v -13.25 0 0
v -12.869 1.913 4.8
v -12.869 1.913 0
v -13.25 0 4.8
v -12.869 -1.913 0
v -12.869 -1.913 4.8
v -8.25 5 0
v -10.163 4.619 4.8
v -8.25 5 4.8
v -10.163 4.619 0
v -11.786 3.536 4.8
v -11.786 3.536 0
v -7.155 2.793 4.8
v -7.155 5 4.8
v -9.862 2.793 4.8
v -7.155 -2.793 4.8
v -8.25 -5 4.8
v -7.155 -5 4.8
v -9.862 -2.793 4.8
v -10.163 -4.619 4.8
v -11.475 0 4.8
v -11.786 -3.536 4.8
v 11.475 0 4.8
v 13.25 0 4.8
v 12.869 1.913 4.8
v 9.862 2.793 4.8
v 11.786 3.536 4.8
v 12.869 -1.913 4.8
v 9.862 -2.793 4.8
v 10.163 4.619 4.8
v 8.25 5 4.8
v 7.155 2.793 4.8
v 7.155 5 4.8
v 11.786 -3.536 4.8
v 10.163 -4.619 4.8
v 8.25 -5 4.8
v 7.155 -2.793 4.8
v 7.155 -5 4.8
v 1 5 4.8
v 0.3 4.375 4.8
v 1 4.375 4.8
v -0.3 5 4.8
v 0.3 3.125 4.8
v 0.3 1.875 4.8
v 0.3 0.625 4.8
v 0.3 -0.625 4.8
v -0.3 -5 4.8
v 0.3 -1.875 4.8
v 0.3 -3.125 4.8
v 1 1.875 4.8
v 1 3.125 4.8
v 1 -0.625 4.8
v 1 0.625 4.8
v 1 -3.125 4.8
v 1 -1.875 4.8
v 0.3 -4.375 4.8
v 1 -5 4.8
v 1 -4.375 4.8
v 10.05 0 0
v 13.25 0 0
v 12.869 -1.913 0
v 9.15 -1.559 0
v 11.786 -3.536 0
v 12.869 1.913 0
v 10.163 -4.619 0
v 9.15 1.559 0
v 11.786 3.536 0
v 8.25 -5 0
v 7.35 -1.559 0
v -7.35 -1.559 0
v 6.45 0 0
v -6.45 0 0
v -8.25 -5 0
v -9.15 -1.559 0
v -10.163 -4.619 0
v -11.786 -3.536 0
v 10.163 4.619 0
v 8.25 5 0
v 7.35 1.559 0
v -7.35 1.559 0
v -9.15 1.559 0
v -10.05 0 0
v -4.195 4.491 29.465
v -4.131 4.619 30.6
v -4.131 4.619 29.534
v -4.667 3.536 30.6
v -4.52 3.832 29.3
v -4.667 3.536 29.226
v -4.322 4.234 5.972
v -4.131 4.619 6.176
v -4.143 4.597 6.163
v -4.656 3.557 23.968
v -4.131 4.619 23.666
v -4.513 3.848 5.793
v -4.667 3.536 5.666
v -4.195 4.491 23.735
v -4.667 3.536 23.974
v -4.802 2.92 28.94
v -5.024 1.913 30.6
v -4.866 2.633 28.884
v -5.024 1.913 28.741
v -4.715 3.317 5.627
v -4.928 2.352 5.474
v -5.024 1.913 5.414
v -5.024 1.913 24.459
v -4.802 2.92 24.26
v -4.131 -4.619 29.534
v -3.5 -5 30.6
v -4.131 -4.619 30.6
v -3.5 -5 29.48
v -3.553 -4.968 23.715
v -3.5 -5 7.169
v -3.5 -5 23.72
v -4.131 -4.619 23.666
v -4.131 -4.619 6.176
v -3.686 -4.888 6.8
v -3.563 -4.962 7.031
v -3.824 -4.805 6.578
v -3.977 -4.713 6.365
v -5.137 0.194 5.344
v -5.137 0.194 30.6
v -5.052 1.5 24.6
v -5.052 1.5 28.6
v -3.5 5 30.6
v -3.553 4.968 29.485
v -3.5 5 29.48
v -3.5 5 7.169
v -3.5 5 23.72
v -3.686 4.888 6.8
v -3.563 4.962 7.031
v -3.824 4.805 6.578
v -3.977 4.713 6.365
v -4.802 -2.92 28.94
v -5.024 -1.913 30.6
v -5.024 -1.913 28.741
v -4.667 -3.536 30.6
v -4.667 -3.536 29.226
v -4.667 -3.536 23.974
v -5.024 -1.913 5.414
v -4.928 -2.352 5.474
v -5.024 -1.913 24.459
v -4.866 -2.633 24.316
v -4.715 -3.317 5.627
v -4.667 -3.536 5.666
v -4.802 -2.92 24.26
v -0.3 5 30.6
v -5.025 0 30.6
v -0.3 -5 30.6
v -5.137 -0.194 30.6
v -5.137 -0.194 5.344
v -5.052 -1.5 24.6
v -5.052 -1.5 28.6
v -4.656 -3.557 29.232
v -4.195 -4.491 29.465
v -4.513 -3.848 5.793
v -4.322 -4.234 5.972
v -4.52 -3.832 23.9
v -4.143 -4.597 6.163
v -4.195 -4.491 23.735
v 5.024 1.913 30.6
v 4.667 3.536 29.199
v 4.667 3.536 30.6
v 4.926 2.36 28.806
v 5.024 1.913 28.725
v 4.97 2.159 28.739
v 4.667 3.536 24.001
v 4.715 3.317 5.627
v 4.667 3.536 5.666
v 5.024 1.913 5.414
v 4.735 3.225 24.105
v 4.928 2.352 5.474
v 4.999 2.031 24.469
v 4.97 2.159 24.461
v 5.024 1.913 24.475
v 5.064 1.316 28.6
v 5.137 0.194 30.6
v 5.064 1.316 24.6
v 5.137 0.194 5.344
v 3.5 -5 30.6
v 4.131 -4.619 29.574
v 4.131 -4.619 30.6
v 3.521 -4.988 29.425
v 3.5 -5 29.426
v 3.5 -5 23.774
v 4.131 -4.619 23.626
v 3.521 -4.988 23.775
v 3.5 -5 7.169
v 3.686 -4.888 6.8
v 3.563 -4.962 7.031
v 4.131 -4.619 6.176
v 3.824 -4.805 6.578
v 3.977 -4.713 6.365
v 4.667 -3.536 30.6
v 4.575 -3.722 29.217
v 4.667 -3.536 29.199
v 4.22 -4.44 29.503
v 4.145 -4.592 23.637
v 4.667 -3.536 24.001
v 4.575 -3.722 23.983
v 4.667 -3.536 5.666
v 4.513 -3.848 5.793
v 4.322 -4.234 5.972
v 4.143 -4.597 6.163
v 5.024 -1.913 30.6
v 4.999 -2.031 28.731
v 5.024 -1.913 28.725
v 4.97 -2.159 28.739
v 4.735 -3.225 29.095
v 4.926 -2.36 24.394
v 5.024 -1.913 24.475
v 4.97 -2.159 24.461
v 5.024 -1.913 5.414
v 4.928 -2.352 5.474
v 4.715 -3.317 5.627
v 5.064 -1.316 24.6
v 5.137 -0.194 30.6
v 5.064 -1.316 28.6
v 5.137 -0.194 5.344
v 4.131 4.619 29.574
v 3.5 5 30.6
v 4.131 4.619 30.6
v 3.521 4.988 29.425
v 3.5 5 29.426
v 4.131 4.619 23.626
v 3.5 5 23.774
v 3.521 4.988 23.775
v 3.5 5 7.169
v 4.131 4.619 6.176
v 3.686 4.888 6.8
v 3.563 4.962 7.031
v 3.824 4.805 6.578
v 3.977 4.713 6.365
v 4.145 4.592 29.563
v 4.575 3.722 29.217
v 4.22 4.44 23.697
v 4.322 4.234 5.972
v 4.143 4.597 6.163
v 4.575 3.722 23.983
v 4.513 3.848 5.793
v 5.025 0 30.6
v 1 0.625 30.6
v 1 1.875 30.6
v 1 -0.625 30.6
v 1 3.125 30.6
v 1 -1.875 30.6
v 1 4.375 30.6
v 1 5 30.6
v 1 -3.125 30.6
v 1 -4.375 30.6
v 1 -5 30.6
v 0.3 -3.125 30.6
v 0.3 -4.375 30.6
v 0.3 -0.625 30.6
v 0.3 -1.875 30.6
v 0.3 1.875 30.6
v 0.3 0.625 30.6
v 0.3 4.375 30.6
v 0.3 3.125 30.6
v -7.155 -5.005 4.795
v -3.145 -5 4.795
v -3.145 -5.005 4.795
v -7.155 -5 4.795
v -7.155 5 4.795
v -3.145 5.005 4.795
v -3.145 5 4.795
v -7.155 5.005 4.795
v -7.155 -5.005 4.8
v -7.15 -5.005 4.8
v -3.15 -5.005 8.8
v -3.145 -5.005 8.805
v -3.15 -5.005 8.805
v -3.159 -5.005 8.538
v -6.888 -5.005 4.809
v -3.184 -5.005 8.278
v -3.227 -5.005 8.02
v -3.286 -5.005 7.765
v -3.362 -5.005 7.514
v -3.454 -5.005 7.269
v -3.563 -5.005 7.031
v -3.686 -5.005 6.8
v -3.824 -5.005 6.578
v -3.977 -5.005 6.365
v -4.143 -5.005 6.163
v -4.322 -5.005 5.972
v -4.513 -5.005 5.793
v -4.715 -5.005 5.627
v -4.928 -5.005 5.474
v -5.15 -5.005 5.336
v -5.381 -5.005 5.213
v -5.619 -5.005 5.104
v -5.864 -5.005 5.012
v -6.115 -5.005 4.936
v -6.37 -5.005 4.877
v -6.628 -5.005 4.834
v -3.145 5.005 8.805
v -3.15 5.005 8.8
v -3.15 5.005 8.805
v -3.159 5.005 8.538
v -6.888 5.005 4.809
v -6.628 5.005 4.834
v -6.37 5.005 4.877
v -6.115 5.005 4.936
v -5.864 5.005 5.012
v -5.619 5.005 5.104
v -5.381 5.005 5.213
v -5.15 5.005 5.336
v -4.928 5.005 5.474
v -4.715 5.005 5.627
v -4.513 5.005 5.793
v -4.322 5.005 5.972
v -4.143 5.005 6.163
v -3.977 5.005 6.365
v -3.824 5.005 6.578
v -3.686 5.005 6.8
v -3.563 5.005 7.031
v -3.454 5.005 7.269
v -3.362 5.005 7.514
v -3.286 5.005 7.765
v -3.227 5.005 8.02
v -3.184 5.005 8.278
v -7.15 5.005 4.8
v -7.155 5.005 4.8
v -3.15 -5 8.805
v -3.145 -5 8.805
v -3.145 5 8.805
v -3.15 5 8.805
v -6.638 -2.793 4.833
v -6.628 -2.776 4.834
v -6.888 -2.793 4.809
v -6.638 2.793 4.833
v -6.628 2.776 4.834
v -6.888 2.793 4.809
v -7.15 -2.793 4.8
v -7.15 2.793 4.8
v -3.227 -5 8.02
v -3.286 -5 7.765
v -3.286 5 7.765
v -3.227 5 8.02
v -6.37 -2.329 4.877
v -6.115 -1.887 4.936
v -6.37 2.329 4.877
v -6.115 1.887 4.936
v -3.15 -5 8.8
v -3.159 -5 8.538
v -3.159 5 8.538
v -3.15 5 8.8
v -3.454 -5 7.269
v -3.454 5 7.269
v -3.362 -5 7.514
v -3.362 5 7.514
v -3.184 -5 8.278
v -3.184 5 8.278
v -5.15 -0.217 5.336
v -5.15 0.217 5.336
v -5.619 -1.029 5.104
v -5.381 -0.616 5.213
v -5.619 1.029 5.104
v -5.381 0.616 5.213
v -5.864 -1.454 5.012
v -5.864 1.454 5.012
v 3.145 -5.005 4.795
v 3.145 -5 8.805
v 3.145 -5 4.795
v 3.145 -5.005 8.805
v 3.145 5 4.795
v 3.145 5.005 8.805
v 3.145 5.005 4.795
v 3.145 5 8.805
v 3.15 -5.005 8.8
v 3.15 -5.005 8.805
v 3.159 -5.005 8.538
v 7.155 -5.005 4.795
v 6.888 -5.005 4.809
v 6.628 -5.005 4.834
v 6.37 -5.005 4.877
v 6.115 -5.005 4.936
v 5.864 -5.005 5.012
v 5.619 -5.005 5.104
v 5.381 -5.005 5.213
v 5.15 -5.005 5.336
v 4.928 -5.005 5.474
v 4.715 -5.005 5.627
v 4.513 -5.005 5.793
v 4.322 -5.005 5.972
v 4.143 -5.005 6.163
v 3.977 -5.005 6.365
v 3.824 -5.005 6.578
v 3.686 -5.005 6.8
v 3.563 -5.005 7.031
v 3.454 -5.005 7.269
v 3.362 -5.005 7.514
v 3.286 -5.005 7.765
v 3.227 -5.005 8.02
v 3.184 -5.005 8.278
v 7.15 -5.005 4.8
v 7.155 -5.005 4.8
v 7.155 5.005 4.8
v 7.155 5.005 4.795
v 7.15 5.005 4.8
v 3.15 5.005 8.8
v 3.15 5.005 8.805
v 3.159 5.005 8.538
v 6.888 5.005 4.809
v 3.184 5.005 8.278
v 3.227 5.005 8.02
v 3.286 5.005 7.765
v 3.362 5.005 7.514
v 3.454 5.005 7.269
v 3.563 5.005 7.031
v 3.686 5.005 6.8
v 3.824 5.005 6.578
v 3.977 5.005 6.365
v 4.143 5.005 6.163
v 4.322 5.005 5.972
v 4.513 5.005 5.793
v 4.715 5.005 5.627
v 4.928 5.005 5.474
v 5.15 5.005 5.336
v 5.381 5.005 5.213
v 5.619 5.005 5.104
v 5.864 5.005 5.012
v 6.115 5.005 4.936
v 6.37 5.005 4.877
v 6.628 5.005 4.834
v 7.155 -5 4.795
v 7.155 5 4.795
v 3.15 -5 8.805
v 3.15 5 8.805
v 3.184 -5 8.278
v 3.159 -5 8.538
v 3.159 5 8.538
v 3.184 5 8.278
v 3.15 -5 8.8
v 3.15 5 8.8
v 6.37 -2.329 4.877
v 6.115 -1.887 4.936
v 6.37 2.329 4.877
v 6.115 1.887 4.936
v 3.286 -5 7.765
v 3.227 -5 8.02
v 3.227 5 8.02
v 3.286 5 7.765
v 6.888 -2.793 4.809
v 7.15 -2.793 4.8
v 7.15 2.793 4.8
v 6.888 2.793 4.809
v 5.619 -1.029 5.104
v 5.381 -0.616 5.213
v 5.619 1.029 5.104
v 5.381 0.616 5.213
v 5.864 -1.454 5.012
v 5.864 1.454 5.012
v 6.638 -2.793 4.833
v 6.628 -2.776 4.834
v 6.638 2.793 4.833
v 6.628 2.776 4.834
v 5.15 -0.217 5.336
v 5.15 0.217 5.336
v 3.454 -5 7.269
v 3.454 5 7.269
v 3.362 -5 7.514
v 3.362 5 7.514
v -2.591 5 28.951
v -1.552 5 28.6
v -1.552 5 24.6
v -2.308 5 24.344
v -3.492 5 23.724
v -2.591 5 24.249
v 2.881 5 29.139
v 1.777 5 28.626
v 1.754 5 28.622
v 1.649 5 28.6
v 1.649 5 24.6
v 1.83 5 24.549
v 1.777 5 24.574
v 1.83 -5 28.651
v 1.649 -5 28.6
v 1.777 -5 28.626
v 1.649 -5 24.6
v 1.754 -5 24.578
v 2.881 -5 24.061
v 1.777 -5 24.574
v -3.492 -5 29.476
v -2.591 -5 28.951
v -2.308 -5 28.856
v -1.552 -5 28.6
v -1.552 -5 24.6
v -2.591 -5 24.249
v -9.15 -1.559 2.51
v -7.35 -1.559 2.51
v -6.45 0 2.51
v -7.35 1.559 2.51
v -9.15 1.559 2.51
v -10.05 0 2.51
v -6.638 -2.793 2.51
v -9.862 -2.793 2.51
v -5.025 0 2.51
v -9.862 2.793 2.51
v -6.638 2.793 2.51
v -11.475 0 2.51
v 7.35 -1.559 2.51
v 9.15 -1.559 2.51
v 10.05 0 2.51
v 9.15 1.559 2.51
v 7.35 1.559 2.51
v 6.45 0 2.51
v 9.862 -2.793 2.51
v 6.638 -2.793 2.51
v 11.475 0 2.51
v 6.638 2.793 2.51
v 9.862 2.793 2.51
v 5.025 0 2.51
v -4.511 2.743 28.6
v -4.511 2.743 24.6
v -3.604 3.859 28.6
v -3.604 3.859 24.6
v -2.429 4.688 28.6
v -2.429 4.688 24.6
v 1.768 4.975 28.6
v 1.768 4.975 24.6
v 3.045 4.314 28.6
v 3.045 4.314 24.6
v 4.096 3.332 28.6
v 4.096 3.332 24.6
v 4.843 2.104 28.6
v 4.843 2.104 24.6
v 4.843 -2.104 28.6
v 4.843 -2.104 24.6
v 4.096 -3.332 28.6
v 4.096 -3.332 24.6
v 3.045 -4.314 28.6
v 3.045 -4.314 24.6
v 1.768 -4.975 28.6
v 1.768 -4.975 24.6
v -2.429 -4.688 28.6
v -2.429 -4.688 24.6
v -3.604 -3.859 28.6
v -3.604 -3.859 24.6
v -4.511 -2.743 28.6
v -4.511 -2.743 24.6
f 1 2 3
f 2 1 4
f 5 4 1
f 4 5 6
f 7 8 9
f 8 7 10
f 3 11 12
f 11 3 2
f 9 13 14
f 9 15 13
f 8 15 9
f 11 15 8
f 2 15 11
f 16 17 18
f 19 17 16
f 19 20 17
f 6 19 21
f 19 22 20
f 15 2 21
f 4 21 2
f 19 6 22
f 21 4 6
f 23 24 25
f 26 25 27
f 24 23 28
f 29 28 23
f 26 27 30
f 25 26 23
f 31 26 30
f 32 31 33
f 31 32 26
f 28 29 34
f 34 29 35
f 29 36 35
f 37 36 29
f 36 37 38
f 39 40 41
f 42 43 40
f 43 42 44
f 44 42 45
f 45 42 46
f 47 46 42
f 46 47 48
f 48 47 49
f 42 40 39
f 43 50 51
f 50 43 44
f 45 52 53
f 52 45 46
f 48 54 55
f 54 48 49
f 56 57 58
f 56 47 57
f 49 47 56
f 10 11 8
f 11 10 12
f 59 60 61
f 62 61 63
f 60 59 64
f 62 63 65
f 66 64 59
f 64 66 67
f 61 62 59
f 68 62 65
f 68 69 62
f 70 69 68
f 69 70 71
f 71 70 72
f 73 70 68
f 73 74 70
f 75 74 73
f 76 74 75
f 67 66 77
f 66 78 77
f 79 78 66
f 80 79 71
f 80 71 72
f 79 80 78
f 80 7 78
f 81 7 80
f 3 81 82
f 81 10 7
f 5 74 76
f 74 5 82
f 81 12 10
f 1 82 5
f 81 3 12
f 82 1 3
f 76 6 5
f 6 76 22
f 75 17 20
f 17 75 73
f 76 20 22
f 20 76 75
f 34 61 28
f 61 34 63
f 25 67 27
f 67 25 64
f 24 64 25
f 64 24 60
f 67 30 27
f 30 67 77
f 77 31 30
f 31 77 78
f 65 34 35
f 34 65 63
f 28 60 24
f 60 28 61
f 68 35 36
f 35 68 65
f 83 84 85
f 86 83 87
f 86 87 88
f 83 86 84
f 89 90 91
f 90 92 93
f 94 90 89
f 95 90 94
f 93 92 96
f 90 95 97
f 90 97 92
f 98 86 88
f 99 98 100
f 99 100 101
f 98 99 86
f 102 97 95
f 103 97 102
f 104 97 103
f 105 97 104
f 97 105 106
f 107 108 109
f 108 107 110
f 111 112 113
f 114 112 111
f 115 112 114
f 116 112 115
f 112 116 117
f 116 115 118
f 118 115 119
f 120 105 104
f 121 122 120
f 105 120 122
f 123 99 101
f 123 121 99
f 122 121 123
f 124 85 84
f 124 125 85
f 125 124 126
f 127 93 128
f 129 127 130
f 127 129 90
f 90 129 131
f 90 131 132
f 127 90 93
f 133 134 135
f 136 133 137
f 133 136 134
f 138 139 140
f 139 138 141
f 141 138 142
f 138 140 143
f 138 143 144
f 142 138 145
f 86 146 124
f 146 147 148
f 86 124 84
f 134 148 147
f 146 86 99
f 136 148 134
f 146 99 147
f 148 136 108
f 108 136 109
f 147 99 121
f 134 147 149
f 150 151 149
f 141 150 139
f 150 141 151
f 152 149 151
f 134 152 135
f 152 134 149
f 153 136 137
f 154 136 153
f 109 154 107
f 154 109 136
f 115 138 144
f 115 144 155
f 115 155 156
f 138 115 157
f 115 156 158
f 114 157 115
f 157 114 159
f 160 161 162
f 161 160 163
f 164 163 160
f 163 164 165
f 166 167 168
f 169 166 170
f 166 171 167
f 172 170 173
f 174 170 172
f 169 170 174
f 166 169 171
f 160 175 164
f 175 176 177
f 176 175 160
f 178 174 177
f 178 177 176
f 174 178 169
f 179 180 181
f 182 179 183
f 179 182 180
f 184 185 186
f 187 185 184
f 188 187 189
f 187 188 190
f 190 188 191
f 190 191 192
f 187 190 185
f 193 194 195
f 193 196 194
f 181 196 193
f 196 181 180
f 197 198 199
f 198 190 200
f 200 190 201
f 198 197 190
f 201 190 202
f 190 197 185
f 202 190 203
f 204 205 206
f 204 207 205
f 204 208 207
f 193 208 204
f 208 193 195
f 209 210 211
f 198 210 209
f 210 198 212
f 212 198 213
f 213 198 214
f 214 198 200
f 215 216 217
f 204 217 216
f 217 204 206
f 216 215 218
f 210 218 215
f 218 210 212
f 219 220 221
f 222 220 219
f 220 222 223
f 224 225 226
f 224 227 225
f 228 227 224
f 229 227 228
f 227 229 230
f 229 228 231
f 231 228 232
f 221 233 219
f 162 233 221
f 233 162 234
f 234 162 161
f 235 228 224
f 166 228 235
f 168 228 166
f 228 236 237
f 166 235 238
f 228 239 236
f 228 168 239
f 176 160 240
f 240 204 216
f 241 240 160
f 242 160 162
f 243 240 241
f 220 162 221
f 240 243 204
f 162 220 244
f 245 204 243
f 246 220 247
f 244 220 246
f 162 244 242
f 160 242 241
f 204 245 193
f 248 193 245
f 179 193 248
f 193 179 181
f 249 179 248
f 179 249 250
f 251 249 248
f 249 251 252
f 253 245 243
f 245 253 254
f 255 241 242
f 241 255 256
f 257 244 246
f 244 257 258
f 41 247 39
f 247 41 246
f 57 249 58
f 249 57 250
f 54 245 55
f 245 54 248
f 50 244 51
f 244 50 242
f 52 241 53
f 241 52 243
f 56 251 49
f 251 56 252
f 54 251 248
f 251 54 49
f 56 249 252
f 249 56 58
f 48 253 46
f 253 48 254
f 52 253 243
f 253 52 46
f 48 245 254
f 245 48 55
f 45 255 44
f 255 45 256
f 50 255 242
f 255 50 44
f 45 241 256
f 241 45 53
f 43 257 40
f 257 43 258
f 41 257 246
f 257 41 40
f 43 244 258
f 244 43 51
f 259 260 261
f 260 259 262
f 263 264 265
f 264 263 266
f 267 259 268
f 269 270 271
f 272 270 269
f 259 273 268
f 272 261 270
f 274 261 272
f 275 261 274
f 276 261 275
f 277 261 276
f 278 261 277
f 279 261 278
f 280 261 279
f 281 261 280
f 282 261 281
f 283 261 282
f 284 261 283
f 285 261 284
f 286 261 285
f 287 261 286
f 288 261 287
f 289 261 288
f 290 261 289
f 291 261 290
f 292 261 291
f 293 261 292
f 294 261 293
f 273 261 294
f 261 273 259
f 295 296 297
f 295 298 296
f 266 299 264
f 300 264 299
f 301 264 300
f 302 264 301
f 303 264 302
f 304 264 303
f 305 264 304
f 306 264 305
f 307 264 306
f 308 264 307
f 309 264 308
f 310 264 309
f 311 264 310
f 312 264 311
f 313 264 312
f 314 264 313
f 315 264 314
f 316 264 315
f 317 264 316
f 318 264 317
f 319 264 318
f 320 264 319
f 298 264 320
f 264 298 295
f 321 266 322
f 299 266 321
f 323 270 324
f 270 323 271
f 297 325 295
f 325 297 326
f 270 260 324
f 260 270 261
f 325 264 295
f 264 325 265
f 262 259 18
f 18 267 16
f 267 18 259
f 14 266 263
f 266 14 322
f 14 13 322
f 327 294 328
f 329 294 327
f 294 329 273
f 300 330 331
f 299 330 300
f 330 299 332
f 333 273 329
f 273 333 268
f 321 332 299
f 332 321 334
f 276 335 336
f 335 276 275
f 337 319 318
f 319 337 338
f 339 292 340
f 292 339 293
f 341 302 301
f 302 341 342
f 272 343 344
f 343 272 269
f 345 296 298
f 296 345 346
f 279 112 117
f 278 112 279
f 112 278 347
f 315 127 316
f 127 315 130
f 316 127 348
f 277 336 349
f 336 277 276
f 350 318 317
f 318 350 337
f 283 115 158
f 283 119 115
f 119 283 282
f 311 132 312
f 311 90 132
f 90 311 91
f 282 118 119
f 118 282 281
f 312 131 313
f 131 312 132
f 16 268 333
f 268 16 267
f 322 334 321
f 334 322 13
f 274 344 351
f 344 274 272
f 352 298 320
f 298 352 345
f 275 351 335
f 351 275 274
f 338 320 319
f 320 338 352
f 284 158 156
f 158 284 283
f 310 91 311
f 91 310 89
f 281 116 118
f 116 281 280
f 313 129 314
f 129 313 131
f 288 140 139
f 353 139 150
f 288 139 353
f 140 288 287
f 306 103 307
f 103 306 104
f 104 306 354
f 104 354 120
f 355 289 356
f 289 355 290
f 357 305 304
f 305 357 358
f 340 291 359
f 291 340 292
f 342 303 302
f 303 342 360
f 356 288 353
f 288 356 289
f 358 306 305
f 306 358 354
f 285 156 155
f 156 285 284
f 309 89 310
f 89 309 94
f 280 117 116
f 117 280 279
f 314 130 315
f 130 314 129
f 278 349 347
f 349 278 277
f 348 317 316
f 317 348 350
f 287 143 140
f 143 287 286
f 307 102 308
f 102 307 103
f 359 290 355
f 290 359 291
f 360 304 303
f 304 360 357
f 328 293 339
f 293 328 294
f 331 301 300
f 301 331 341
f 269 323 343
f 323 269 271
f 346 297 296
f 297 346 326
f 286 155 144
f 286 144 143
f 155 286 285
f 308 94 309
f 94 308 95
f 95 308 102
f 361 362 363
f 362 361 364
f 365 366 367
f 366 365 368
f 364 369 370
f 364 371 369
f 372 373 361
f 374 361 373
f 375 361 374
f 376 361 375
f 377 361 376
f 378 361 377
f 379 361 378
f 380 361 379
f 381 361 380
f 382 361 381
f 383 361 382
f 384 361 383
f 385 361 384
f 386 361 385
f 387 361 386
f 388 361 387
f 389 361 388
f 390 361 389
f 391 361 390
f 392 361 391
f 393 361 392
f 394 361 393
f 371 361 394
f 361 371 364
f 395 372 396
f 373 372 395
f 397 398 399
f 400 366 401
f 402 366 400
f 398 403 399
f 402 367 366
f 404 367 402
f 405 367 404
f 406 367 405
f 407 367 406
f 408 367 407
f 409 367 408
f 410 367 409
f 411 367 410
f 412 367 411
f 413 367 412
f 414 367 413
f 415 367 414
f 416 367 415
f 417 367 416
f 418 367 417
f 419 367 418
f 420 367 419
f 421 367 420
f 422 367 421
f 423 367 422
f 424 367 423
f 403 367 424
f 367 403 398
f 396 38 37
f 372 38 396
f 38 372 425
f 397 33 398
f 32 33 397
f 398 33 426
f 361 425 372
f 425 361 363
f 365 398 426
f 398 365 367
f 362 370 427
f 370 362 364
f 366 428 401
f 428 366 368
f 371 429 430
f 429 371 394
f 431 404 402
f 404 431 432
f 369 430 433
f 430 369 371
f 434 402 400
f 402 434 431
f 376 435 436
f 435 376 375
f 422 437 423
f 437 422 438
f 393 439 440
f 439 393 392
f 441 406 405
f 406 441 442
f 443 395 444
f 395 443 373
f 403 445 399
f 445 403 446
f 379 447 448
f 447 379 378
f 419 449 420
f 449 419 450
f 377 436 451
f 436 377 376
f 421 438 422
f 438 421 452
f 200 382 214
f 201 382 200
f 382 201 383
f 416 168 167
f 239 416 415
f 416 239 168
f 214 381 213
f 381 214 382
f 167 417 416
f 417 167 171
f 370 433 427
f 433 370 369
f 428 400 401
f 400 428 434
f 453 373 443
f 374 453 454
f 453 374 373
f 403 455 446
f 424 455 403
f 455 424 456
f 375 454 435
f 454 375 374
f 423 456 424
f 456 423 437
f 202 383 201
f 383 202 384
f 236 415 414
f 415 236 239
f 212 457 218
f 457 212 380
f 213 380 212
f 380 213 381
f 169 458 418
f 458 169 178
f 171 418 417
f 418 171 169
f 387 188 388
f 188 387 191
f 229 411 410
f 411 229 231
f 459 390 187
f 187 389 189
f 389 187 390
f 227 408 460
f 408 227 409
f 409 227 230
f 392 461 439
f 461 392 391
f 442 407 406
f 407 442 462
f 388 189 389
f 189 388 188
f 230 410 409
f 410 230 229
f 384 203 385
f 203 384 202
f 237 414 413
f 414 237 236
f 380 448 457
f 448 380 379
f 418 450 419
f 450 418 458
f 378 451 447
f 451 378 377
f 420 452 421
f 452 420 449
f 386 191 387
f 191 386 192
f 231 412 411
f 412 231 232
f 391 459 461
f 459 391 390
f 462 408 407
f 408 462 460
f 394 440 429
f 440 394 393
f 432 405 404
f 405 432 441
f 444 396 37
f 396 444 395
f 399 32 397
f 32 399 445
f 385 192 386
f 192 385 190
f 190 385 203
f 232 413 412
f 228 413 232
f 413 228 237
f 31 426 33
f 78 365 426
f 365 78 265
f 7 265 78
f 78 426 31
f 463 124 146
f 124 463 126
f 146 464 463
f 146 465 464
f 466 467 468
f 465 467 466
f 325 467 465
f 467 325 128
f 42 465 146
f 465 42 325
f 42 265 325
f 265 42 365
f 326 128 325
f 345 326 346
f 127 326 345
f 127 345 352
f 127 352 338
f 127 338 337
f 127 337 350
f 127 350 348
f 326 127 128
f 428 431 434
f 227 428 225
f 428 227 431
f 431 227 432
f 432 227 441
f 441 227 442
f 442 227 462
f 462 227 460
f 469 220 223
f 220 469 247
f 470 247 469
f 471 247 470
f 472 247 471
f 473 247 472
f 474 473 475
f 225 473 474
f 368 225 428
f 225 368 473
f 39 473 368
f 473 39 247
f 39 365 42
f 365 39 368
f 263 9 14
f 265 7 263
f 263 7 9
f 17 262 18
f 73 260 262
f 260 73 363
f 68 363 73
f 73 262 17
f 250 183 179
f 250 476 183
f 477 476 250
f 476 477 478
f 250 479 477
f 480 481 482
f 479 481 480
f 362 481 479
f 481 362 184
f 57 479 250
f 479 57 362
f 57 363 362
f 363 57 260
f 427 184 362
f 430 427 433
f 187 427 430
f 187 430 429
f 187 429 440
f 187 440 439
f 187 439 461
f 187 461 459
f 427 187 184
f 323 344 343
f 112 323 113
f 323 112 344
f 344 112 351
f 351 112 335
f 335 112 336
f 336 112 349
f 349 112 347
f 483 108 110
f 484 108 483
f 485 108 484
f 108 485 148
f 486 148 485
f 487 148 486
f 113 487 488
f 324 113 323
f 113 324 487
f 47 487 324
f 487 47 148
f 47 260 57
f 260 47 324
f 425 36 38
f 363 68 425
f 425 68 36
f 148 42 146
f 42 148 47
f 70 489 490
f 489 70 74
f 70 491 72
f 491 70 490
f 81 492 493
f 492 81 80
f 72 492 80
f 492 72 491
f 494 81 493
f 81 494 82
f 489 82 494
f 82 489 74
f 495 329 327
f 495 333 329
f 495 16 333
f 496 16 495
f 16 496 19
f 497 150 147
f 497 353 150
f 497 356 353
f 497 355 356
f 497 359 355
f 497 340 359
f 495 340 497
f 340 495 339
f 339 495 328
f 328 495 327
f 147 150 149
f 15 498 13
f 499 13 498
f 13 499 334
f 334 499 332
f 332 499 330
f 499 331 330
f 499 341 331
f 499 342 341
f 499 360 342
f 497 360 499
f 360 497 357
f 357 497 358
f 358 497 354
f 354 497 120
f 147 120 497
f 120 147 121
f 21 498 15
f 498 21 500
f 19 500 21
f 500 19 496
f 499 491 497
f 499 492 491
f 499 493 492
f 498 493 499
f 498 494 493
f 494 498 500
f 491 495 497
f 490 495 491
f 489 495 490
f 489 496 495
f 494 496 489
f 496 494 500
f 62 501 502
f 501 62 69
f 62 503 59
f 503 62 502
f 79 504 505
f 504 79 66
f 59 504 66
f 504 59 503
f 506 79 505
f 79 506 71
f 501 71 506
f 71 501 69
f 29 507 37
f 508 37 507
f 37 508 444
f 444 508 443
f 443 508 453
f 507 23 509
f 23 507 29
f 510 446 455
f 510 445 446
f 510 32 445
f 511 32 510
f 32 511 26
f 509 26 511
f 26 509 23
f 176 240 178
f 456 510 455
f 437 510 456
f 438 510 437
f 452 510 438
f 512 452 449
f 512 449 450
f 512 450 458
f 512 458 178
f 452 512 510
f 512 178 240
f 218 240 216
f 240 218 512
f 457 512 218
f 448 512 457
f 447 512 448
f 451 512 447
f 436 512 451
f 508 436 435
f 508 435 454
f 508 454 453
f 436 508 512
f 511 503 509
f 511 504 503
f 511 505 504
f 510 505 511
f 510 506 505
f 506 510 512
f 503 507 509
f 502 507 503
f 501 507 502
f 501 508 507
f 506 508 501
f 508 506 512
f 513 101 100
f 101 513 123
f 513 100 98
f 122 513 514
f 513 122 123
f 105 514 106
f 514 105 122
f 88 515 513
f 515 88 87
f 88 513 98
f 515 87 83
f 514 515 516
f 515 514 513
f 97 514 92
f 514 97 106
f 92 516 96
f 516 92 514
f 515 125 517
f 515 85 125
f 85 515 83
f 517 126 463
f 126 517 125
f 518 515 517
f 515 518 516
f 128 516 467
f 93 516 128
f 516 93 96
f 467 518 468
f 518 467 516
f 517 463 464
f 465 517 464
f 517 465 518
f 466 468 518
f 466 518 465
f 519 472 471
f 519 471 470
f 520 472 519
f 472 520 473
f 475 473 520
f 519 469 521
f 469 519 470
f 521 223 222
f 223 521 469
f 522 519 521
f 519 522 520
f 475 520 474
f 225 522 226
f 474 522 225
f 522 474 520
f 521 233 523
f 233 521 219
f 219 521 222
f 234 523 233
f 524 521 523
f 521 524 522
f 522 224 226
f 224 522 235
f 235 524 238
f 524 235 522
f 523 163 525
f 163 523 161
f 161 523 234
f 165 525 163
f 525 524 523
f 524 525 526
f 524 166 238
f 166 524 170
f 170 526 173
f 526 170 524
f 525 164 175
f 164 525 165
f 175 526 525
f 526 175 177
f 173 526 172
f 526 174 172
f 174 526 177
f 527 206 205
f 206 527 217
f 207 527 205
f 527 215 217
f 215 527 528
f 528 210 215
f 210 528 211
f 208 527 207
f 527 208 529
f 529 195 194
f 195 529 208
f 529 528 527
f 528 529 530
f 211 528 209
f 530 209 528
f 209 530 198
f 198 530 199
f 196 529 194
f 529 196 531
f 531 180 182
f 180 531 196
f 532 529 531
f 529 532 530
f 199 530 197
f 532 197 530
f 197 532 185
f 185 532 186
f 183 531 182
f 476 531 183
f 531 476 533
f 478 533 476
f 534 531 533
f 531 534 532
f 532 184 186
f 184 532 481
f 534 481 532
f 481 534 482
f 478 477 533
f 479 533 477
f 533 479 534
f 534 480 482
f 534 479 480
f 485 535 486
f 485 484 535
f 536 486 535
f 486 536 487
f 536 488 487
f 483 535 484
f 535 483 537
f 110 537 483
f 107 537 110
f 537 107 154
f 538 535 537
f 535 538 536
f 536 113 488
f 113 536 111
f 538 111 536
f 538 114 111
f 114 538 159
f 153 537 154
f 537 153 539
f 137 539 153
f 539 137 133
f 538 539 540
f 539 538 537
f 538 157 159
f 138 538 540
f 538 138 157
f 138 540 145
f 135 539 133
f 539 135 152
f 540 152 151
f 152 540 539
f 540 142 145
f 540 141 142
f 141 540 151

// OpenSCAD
// file: roundEdges.scad
/* roundEdges
 * Copyright (c) 2012 by Krallinger Sebastian [s.krallinger+cc@gmail.com]
 * Dual-licensed under 
 * Creative Commons Attribution-ShareAlike 3.0 (CC BY-SA) [http://creativecommons.org/licenses/by-sa/3.0/]
 * and
 * LGPL v2 or later [http://www.gnu.org/licenses/].
 */


//Rounded Edges
module roundEdge(_a=0,_r=1,_l=1,_fn=100){
	rotate (a=[0,0,_a]){
		translate(v=[_r,_r,0]){
			rotate (a=[0,0,0]) rotate (a=[0,0,180]){
				difference() {
					translate (v=[-OS/2,-OS/2,-OS/2])
						cube (size = [_r+OS,_r+OS,_l+OS],center=false );
					translate (v=[0,0,-OS*2/2])
						cylinder (h = _l+OS*2, r=_r, center = false, $fn=_fn);
				}
			}
		}
	}
}
//roundEdge(_a=0,_l=10);
// file: utilities.scad
/*
 * Utility functions.
 *
 * Originally by Hans Häggström, 2010.
 * Dual licenced under Creative Commons Attribution-Share Alike 3.0 and LGPL2 or later
 */

//include <units.scad>


/******************** Disance Poins ******************************/
function distance3D(a,b) =sqrt( (a[0] - b[0])*(a[0] - b[0]) +
                                (a[1] - b[1])*(a[1] - b[1]) +
                                (a[2] - b[2])*(a[2] - b[2]) );
//Obsolet
function distance(a, b) = distance3D(a,b);

function distance2D(a,b) = sqrt( (a[0] - b[0])*(a[0] - b[0]) +
                                (a[1] - b[1])*(a[1] - b[1]));
								
function distance1D(a,b) = sqrt(a*a+b*b);
//Obsolet
function length2(a) = distance1D(a[0],a[1]);


/************************ vector *************************/
function normalized(a) = a / (max(distance3D([0,0,0], a), 0.00001));

function normalized_axis(a) = a == "x" ? [1, 0, 0]:
                   a == "y" ? [0, 1, 0]:
                   a == "z" ? [0, 0, 1]: normalized(a);

function angleOfNormalizedVector(n) = [0, -atan2(n[2], distance1D([n[0], n[1]])), atan2(n[1], n[0]) ];

function angle(v) = angleOfNormalizedVector(normalized(v));

function angleBetweenTwoPoints(a, b) = angle(normalized(b-a));

function _angleVectore2D(a) = atan2(a[0],a[1]);
function angle_betweentTwoPoints2D (a,b) = _angleVectore2D(b-a);


/********************** Circel ***************************/

function circel_area(r) = PI * r * r;

function circel_radius3Points(a,b,c) = (distance2D(a,b) * distance2D(b,c) * distance2D(c,a)) / (4 * triangle_area3Points(a,b,c));

function circel_radius3lengths(a,b,c) = (a*b*c) / (4 * triangle_area3lengths(a,b,c));


/********************** triangle **************************/
//Satz des Heron
function triangle_area3lengths(a,b,c) = sqrt((a+b+c)*(a+b-c)*(b+c-a)*(c+a-b))/4;

function triangle_area3Points(a,b,c) = triangle_area3lengths(distance2D(a,b),distance2D(b,c),distance2D(c,a));



/************************** coordinate systems translation ****/
//[radius,phi] <=> [x,y]
function conv2D_cartesian2polar(x) = [ distance1D(x[0],x[1]) , atan2(x[1],x[0]) ];
function conv2D_polar2cartesian(x) = [ x[0]*cos(x[1]) , x[0]*sin(x[1]) ];


CENTER = 0;
LEFT = -0.5;
RIGHT = 0.5;
TOP = 0.5;
BOTTOM = -0.5;

FlatCap =0;
ExtendedCap =0.5;
CutCap =-0.5;


module fromTo(from=[0,0,0], to=[1,0,0], size=[1, 1], align=[CENTER, CENTER], material=[0.5, 0.5, 0.5], name="", endExtras=[0,0], endCaps=[FlatCap, FlatCap], rotation=[0,0,0], printString=true) {

  angle = angleBetweenTwoPoints(from, to);
  length = distance(from, to) + endCaps[0]*size[0] + endCaps[1]*size[0] + endExtras[0] + endExtras[1];

  if (length > 0) {
    if (printString) echo(str( "  " ,name, " ", size[0], "mm x ", size[1], "mm, length ", length, "mm"));

    color(material)
      translate(from)
        rotate(angle)
          translate( [ -endCaps[0]*size[0] - endExtras[0], size[0]*(-0.5-align[0]), size[1]*(-0.5+align[1]) ] )
            rotate(rotation)
              scale([length, size[0], size[1]]) child();
  }
}

module part(name) {
  echo("");
  echo(str(name, ":"));
}
// file: config.scad
/* config [c]
 * Copyright (c) 2012 by Krallinger Sebastian [s.krallinger+cc@gmail.com]
 * Dual-licensed under 
 * Creative Commons Attribution-ShareAlike 3.0 (CC BY-SA) [http://creativecommons.org/licenses/by-sa/3.0/]
 * and
 * LGPL v2 or later [http://www.gnu.org/licenses/].
 */

/******************************************************************************/ 
/*                              Main configuration                            */
/******************************************************************************/

/*-----------------------------------x axis-----------------------------------*/
c_x_axis_length = 333; // usable lenth. If you use an extruder which is longer then the H-Xtruder-Mount.scad you have to add this overcut here.
c_x_axis_smoothRod_diam = 8.1;

c_x_axis_dist = 35;

/*-----------------------------------y axis-----------------------------------*/
c_y_axis_length = 333; // usable lenth. If your extruder nozzel exit is not center to the H-Xtruder-Mount.scad you have to add the offset here.
c_y_axis_smoothRod_diam = 8.1;
c_y_axis_tabel_zDirOffset = 14.321; // offset of the center of the y axis to the tabel contact plain

/*-----------------------------------z axis-----------------------------------*/
c_z_axis_length = 333; // usable lenth. If the nozzel of the extruder exids the lower edge of the H-X-Carriage.scad than you have to add the overcut here.
c_z_axis_smoothRod_diam = 12.2;

c_z_axis_rodsDist = 32; // distance between threded rod and smooth rod

/******************************************************************************/ 
/*                                  linear Bearings                           */
/******************************************************************************/
c_lber_length       = 24.2;
c_lber_diam         = 15.3;

/*-----------------------------------x axis-----------------------------------*/
c_xAxis_lber_length = c_lber_length;
c_xAxis_lber_diam   = c_lber_diam;
/*----------------------------------y axis------------------------------------*/
c_yAxis_lber_length = c_lber_length;
c_yAxis_lber_diam   = c_lber_diam;
/*----------------------------------z axis------------------------------------*/
c_zAxis_lber_length = c_lber_length;
c_zAxis_lber_diam   = 12 + c_lber_diam-8;

/******************************************************************************/ 
/*                                    BELT                                    */
/******************************************************************************/
c_belt_thickness      = 1.3;
c_belt_width          = 6;
c_belt_teethDist      = 2.5;
c_belt_teethDepth     = 0.7;

/*-----------------------------------x axis-----------------------------------*/
//belt
c_xAxis_belt_thickness      = c_belt_thickness;
c_xAxis_belt_width          = c_belt_width;
c_xAxis_belt_teethDist      = c_belt_teethDist;
c_xAxis_belt_teethDepth     = c_belt_teethDepth;

// pully
c_xAxis_pully_diam = 9-c_xAxis_belt_thickness*2; // innes (in the teeth molde) diameter of the pully

// diviater
c_xAxis_bearingDiviater_diam = 26; // diameter of the diviater (so the diameter of the centerpoint to the teeth top of the belt) 

// distances
c_xAxis_beltCenter_xAxisDist     = 38;
c_xAxis_beltCenter_motorScrewHoleDist     = 12;

c_xAxis_beltTop_topxAxisDist = -(c_x_axis_dist/2)+c_xAxis_pully_diam/2; // distece between center of the top x axis and toothed side of the belt in z dir

/*-----------------------------------y axis-----------------------------------*/
c_yAxis_belt_thickness      = c_belt_thickness;
c_yAxis_belt_width          = c_belt_width;
c_yAxis_belt_teethDist      = c_belt_teethDist;
c_yAxis_belt_teethDepth     = c_belt_teethDepth;

c_y_axis_beltCenter_zDirOffset = 14.6; // offset of the center of the belt to the tabel contact plain

/******************************************************************************/ 
/*                                  support                                   */
/******************************************************************************/
c_xDirSupp_thredRod_altitude    = [8.266,45.497];
c_xDirSupp_thredRod_zAxisDist   = 38.95-8.5;

/******************************************************************************/ 
/*                                  motor                                     */
/******************************************************************************/
c_motorShaft_diam            = 5; // motor axis diameter
c_motorShaft_length          = 25; // motor axis length from pilot
c_motorPilot_diam            = 27.5; // motor pilot diameter
c_motorScrewHole_diam        = 3.3; // motor screw holde diameter
c_motorScrewHoles_centerDist = 43.841/2; // motor holes distance from axis center
c_motor_sideLength           = 42.1; // length of the motor side (rectangular motor)

/*-----------------------------------x axis-----------------------------------*/
c_xAxis_motorShaft_diam            = c_motorShaft_diam;
c_xAxis_motorShaft_length          = c_motorShaft_length;
c_xAxis_motorPilot_diam            = c_motorPilot_diam ;
c_xAxis_motorScrewHole_diam        = c_motorScrewHole_diam ;
c_xAxis_motorScrewHoles_centerDist = c_motorScrewHoles_centerDist;
c_xAxis_motor_sideLength           = c_motor_sideLength;

/*-----------------------------------y axis-----------------------------------*/
c_yAxis_motorShaft_diam            = c_motorShaft_diam;
c_yAxis_motorShaft_length          = c_motorShaft_length;
c_yAxis_motorPilot_diam            = c_motorPilot_diam ;
c_yAxis_motorScrewHole_diam        = c_motorScrewHole_diam ;
c_yAxis_motorScrewHoles_centerDist = c_motorScrewHoles_centerDist;
c_yAxis_motor_sideLength           = c_motor_sideLength;

/*-----------------------------------z axis-----------------------------------*/
c_zAxis_motorShaft_diam            = c_motorShaft_diam;
c_zAxis_motorShaft_length          = c_motorShaft_length;
c_zAxis_motorPilot_diam            = c_motorPilot_diam ;
c_zAxis_motorScrewHole_diam        = c_motorScrewHole_diam ;
c_zAxis_motorScrewHoles_centerDist = c_motorScrewHoles_centerDist;
c_zAxis_motor_sideLength           = c_motor_sideLength;
// file: teardrop.scad
// teardrop V2


module teardrop (r=4.5,h=20,top_and_bottom=false)
{
	rotate([-270,0,90])
	linear_extrude(height=h,convexity=10)
	{
		circle(r=r);
		polygon(points=[[0,0],[r*cos(30),r*sin(30)],[0.5*r,r],[-0.5*r,r],[-r*cos(30),r*sin(30)]],
				paths=[[0,1,2,3,4]]);
		if (top_and_bottom)
		polygon(points=[[0,0],[r*cos(30),-r*sin(30)],[0.5*r,-r],[-0.5*r,-r],[-r*cos(30),-r*sin(30)]],
				paths=[[0,1,2,3,4]]);

	}
}

module teardropFlat (r=4.5,h=20,top_and_bottom=false)
{
	rotate([-270,0,90])
	linear_extrude(height=h,convexity=10)
	{
		circle(r=r);
		polygon(points=[[0,0],[r*cos(20),r*sin(20)],[0.6*r,r],[-0.6*r,r],[-r*cos(20),r*sin(20)]],
				paths=[[0,1,2,3,4]]);
		if (top_and_bottom)
		polygon(points=[[0,0],[r*cos(20),-r*sin(20)],[0.5*r,-r],[-0.5*r,-r],[-r*cos(20),-r*sin(20)]],
				paths=[[0,1,2,3,4]]);

	}
}

module teardropcentering (r=4.5,h=20)
{
	rotate([-270,0,90])
	linear_extrude(height=h)
	{
		circle(r=r, $fn = 24);
		polygon(points=[[0,0],[r*cos(30),r*sin(30)],[0.5*r,1.2*r],[-0.5*r,1.2*r],[-r*cos(30),r*sin(30)]],
				paths=[[0,1,2,3,4]]);
	}
}

module teardropcentering2 (r=4.5,h=20)
{
	//rotate([-270,0,90])
	difference(){
	linear_extrude(height=h)
	{
		circle(r=r, $fn = 24);
		polygon(points=[[0,0],[r*cos(30),r*sin(30)],[0.5*r,1.2*r],[-0.5*r,1.2*r],[-r*cos(30),r*sin(30)]],
				paths=[[0,1,2,3,4]]);
	}
	translate(v = [-1.5*r, -1.5*r,-1])cube(size =[3*r,1.5*r,h+2]);
	}
}
// file: H-Y-beltClamp_alternativ.scad
/* H-Y-BeltClamp_Alternativ [Ybdaa]
 * Copyright (c) 2012 by Krallinger Sebastian [s.krallinger+cc@gmail.com]
 * Dual-licensed under
 * Creative Commons Attribution-ShareAlike 3.0 (CC BY-SA) [http://creativecommons.org/licenses/by-sa/3.0/]
 * and
 * LGPL v2 or later [http://www.gnu.org/licenses/].
 */

include <config.scad>
include <units.scad>
include <utilities.scad>
include <metric.scad>

include <roundEdges.scad>



/*------------------------------------general---------------------------------*/
Ybda_mode = "-";
//Ybda_mode = "print";  $fn=24*4;   // can be print or inspect [overlays the Ybda_model with the original Ybda_model] (uncomment next line)
//Ybda_mode = "printSet";  $fn=24*4;
Ybda_mode = "inspect";
//Ybda_mode = "assembly";


Ybda_thinWallThickness   = 1;
Ybda_genWallThickness    = 2.5;
Ybda_strongWallThickness = 10;

Ybda_reinforcement_r = 4;

/*------------------------------------belt------------------------------------*/
Ybda_belt_thickness      = c_yAxis_belt_thickness;
Ybda_belt_width          = c_yAxis_belt_width;
Ybda_belt_teethDist      = c_yAxis_belt_teethDist;
Ybda_belt_teethDepth     = c_yAxis_belt_teethDepth;
Ybda_belt_topOffset      = c_y_axis_beltCenter_zDirOffset;  // from top plate to the top edge of the belt
Ybda_belt_tolerance      = [2,1]; //w,t

/*------------------------------------zip ties--------------------------------*/
Ybda_zipTies_width       = 4;
Ybda_zipTies_thickness   = 2;


/*------------------------------------internal--------------------------------*/
_Ybda_base_size = [Ybda_genWallThickness*2+ Ybda_belt_thickness*2 + Ybda_belt_tolerance[1]*2 + m3_nut_diameter*2 + 4* Ybda_thinWallThickness,
				   Ybda_strongWallThickness,
				   Ybda_genWallThickness+m3_nut_heigth];

_Ybda_clamp_heigt = Ybda_belt_topOffset + Ybda_belt_width + Ybda_belt_tolerance[1] + Ybda_zipTies_width + 2*Ybda_genWallThickness;

_Ybda_teeth_dist = (Ybda_belt_thickness- Ybda_belt_teethDepth);

module H_yBeltClam_alt(HasFoot = true) {
	difference() {
		union(){
			if (HasFoot)
			for (i=[-(_Ybda_base_size[0]-Ybda_strongWallThickness)/2, (_Ybda_base_size[0]-Ybda_strongWallThickness)/2]){
				translate([i, 0, 0])
				cylinder(r=_Ybda_base_size[1]/2, h=_Ybda_base_size[2], center=false);
			}

			if (HasFoot)
			translate([0, 0, _Ybda_base_size[2]/2])
				cube(size=_Ybda_base_size- [_Ybda_base_size[1],0,0], center=true);

			// outer clamp
			translate([(_Ybda_teeth_dist/2+Ybda_belt_teethDepth+Ybda_genWallThickness/2) * 1, 0, _Ybda_clamp_heigt/2])
				cube(size=[Ybda_genWallThickness, Ybda_strongWallThickness, _Ybda_clamp_heigt], center=true);
			translate([(_Ybda_teeth_dist/2+Ybda_genWallThickness/2 + Ybda_belt_teethDepth/2) * -1, 0, _Ybda_clamp_heigt/2])
				cube(size=[Ybda_genWallThickness + Ybda_belt_teethDepth, Ybda_strongWallThickness, _Ybda_clamp_heigt], center=true);

			// clamp support
			for (i=[-1,1])
			translate([(_Ybda_teeth_dist/2+Ybda_belt_teethDepth+Ybda_genWallThickness) * i, 0, 0])
			scale([0.33, 1, 1])
				cylinder(r=Ybda_strongWallThickness/2, h=_Ybda_clamp_heigt, center=false);

			// belt teeth conector
			for (y=[-Ybda_strongWallThickness/2+ Ybda_belt_teethDist/2:Ybda_belt_teethDist:Ybda_strongWallThickness/2- Ybda_belt_teethDepth/2])
			translate([(_Ybda_teeth_dist/2 + Ybda_belt_teethDepth/2), y, _Ybda_clamp_heigt/2])
				cube(size=[Ybda_belt_teethDepth, Ybda_belt_teethDist/2, _Ybda_clamp_heigt], center=true);


			if (HasFoot)
			for (i=[[-1,90],[1,0]])
			translate([(Ybda_belt_thickness/2+Ybda_genWallThickness)*i[0],_Ybda_base_size[1]/2, _Ybda_base_size[2]])
			rotate(a=90,v=X)
			 roundEdge(_a=i[1],_r=Ybda_reinforcement_r,_l=_Ybda_base_size[1],_fn=48*2);
		}
		union(){
			if (HasFoot)
			for (i=[-(_Ybda_base_size[0]-Ybda_strongWallThickness)/2, (_Ybda_base_size[0]-Ybda_strongWallThickness)/2])
			translate([i, 0, 0]) {
				translate([0, 0, -OS])
					cylinder(r=m3_diameter/2, h=_Ybda_base_size[2]+2*OS, center=false);

				translate([0, 0, _Ybda_base_size[2]-m3_nut_heigth+OS])
					cylinder(r=m3_nut_diameter/2, h=_Ybda_clamp_heigt, center=false,$fn=6);
			}

			//zip tie coutout
			translate([0, 0, _Ybda_clamp_heigt- Ybda_thinWallThickness - Ybda_zipTies_width*0.75]) {
				rotate_extrude(convexity = 10)
				translate([ distance1D(Ybda_strongWallThickness/2,Ybda_belt_thickness+Ybda_genWallThickness)- Ybda_zipTies_thickness/2,0, 0])
				rotate(a=-90,v=Z)
				polygon(points=[[-Ybda_zipTies_width/2,0],[Ybda_zipTies_width/2,0],[Ybda_zipTies_width,Ybda_zipTies_thickness],[-Ybda_zipTies_width,Ybda_zipTies_thickness],[-Ybda_zipTies_width/2,0]]);
				*difference() {


					cylinder(r=Ybda_strongWallThickness, h=Ybda_zipTies_thickness+2*OS, center=true);
					cylinder(r=distance1D(Ybda_strongWallThickness/2,Ybda_belt_thickness+Ybda_genWallThickness)- Ybda_zipTies_thickness/2, h=Ybda_zipTies_width, center=true);
				}
			}
		}
	}

}


if (Ybda_mode == "inspect") {
	H_yBeltClam_alt();
}

module H_yBeltClam_alt_prinSet() {
	for (i=[-Ybda_strongWallThickness/2-0.5,+Ybda_strongWallThickness/2+0.5])
	translate([0, i, 0])
	H_yBeltClam_alt();
}
if (Ybda_mode == "printSet") {
	H_yBeltClam_alt_prinSet();
}

module H_yBeltClam_alt_print() {
	H_yBeltClam_alt();
}
if (Ybda_mode == "print") {
	H_yBeltClam_alt_print();
}
// file: metric.scad
// PRUSA Mendel  
// Default metric sizes
// GNU GPL v2
// Josef Průša
// josefprusa@me.com
// prusadjs.cz
// http://www.reprap.org/wiki/Prusa_Mendel
// http://github.com/prusajr/PrusaMendel

// RODS

threaded_rod_diameter      = 8.2;
smooth_bar_diameter        = 8;

// Nuts and bolts
// For all nuttraps and screw holse 
m8_diameter                = 8.9;
m8_nut_diameter            = 15.3;
m8_nut_wallDist            = _wallDistFromDia(m8_nut_diameter);
m8_nut_heigth              = 6.3;

m4_diameter                = 4.5;
m4_nut_diameter            = 8.2;
m4_nut_heigth              = 3.2;

m3_diameter                = 3.6;
m3_nut_diameter            = 6.45;
m3_nut_heigth              = 2.3;
m3_nut_wallDist            = _wallDistFromDia(m3_nut_diameter);
m3_nut_diameter_horizontal = 6.1;

// elongetaed nuttraps
// where a nut is put in an slot and inthere hits the perpendicular threadhole
m3_elongNtt_tolerance      = [0.5,0,0.5];// additional [diameter,depth,height]  // depth is not implemented

// linear Bearings
lber_length                = 24;
lber_diam                  = 15.3;

// Motors

motor_shaft                = 5.5;


/******************************************************************************/ 
/*                                  INTERNAL                                  */
/******************************************************************************/
/*-----------------!!! do not change things below this !!!--------------------*/
m3_elongNtt_diameter = m3_nut_diameter + m3_elongNtt_tolerance[0];
m3_elongNtt_wallDist = _wallDistFromDia(m3_elongNtt_diameter);
m3_elongNtt_height = m3_nut_heigth + m3_elongNtt_tolerance[2];



function _wallDistFromDia(dia) = cos(30)*dia;
// file: units.scad
/*
 * Basic units.
 * 
 * Originally by Hans Häggström, 2010.
 * Dual licenced under Creative Commons Attribution-Share Alike 3.0 and LGPL2 or later
 */


mm = 1;
cm = 10 * mm;
dm = 100 * mm;
m = 1000 * mm;

inch = 25.4 * mm;

X = [1, 0, 0];
Y = [0, 1, 0];
Z = [0, 0, 1];

M3 = 3*mm;
M4 = 4*mm;
M5 = 5*mm;
M6 = 6*mm;
M8 = 8*mm;


// When a small distance is needed to overlap shapes for boolean cutting, etc.
epsilon = 0.01*mm;
OS = epsilon;  // Over size
// main file
/* TabelClamp [tc]
 * Copyright (c) 2012 by Krallinger Sebastian [s.krallinger+cc@gmail.com]
 * Dual-licensed under
 * Creative Commons Attribution-ShareAlike 3.0 (CC BY-SA) [http://creativecommons.org/licenses/by-sa/3.0/]
 * and
 * LGPL v2 or later [http://www.gnu.org/licenses/].
 */

include <units.scad>
include <metric.scad>
include <H-Y-beltClamp_alternativ.scad>
include <teardrop.scad>


/*------------------------------------general---------------------------------*/
tc_mode = "-";
//tc_mode = "printSet";  $fn=24*4;    // can be print or inspect [overlays the tc_model with the original tc_model] (uncomment next line)
//tc_mode = "print";  $fn=24*4;
//tc_mode = "inspect";

tc_thinWallThickness         = 1;
tc_genWallThickness          = 3;
tc_strongWallThickness       = 9;

tc_horizontalSuportThickness = 0.35;
tc_verticalSupportThickness  = 0.5;


/*------------------------------------rod-------------------------------------*/
tc_rod_diam                  = m8_diameter;

/*------------------------------------general---------------------------------*/

tc_thickness                 = tc_strongWallThickness;
tc_side                      = tc_rod_diam + 2*tc_genWallThickness;
tc_clip_offset               = tc_rod_diam/2 + 6;
tc_clip_size                 = [tc_side,7,3.5];

/******************************************************************************/
/*                                  INTERNAL                                  */
/******************************************************************************/
module TabelClamp() {
	difference() {
		union(){
			cube(size=[tc_side, tc_thickness, tc_side], center=true);

			translate([-tc_side/2, -tc_thickness/2, 0])
			cube(size=[tc_side, tc_thickness, tc_clip_offset], center=false);

			translate([0, 0, tc_clip_offset])
			rotate(a=90,v=Y)
			rotate(a=90,v=Z)
			linear_extrude(height = tc_clip_size[0], center = true, convexity = 10, twist = 0)
				polygon(points=[[-tc_thickness/2,0], [tc_thickness/2 + tc_clip_size[1],0], [tc_thickness/2,tc_clip_size[2]], [-tc_thickness/2,tc_clip_size[2]]]);
		}
		union(){
			rotate(a=90,v=X)
				cylinder(r=tc_rod_diam/2, h=tc_thickness+2*OS, center=true);
		}
	}
}

module beltClamp() {
	translate([0, 0, tc_genWallThickness])
	difference() {
		union(){
			H_yBeltClam_alt(HasFoot = false);

			translate([0, -_Ybda_base_size[1]/2, tc_rod_diam/2])
			rotate(a=90,v=Z)
			rotate(a=180,v=X)
				teardropFlat (r=tc_rod_diam/2 + tc_genWallThickness,h=_Ybda_base_size[1],top_and_bottom=false);
		}
		union(){
			translate([0, -_Ybda_base_size[1]/2 - OS, tc_rod_diam/2])
			rotate(a=90,v=Z)
				teardrop (r=tc_rod_diam/2,h=_Ybda_base_size[1]+2*OS,top_and_bottom=false);
		}
	}
}
//!beltClamp();



if (tc_mode == "inspect") {
	TabelClamp();
}
module TabelClamp_print() {
	translate([0, 0, tc_side/2])
	rotate(a=90,v=Y)
		TabelClamp();
}
module TabelClamp_printSet() {
	translate([0, tc_thickness + 2, 0]) {
		translate([0, -tc_thickness/2 - 0.5, 0])
		TabelClamp_print();

		translate([0, tc_thickness/2 + 0.5, 0])
		rotate(a=180,v=Z)
			TabelClamp_print();
	}

	for (i=[-1 ,1])
	translate([i*( tc_genWallThickness + tc_rod_diam/2 + 0.5), -_Ybda_base_size[1]/2-0.5, 0])
		beltClamp();
}
if (tc_mode == "printSet") {
	TabelClamp_printSet();
}
if (tc_mode == "print") {
	TabelClamp_print();
}
